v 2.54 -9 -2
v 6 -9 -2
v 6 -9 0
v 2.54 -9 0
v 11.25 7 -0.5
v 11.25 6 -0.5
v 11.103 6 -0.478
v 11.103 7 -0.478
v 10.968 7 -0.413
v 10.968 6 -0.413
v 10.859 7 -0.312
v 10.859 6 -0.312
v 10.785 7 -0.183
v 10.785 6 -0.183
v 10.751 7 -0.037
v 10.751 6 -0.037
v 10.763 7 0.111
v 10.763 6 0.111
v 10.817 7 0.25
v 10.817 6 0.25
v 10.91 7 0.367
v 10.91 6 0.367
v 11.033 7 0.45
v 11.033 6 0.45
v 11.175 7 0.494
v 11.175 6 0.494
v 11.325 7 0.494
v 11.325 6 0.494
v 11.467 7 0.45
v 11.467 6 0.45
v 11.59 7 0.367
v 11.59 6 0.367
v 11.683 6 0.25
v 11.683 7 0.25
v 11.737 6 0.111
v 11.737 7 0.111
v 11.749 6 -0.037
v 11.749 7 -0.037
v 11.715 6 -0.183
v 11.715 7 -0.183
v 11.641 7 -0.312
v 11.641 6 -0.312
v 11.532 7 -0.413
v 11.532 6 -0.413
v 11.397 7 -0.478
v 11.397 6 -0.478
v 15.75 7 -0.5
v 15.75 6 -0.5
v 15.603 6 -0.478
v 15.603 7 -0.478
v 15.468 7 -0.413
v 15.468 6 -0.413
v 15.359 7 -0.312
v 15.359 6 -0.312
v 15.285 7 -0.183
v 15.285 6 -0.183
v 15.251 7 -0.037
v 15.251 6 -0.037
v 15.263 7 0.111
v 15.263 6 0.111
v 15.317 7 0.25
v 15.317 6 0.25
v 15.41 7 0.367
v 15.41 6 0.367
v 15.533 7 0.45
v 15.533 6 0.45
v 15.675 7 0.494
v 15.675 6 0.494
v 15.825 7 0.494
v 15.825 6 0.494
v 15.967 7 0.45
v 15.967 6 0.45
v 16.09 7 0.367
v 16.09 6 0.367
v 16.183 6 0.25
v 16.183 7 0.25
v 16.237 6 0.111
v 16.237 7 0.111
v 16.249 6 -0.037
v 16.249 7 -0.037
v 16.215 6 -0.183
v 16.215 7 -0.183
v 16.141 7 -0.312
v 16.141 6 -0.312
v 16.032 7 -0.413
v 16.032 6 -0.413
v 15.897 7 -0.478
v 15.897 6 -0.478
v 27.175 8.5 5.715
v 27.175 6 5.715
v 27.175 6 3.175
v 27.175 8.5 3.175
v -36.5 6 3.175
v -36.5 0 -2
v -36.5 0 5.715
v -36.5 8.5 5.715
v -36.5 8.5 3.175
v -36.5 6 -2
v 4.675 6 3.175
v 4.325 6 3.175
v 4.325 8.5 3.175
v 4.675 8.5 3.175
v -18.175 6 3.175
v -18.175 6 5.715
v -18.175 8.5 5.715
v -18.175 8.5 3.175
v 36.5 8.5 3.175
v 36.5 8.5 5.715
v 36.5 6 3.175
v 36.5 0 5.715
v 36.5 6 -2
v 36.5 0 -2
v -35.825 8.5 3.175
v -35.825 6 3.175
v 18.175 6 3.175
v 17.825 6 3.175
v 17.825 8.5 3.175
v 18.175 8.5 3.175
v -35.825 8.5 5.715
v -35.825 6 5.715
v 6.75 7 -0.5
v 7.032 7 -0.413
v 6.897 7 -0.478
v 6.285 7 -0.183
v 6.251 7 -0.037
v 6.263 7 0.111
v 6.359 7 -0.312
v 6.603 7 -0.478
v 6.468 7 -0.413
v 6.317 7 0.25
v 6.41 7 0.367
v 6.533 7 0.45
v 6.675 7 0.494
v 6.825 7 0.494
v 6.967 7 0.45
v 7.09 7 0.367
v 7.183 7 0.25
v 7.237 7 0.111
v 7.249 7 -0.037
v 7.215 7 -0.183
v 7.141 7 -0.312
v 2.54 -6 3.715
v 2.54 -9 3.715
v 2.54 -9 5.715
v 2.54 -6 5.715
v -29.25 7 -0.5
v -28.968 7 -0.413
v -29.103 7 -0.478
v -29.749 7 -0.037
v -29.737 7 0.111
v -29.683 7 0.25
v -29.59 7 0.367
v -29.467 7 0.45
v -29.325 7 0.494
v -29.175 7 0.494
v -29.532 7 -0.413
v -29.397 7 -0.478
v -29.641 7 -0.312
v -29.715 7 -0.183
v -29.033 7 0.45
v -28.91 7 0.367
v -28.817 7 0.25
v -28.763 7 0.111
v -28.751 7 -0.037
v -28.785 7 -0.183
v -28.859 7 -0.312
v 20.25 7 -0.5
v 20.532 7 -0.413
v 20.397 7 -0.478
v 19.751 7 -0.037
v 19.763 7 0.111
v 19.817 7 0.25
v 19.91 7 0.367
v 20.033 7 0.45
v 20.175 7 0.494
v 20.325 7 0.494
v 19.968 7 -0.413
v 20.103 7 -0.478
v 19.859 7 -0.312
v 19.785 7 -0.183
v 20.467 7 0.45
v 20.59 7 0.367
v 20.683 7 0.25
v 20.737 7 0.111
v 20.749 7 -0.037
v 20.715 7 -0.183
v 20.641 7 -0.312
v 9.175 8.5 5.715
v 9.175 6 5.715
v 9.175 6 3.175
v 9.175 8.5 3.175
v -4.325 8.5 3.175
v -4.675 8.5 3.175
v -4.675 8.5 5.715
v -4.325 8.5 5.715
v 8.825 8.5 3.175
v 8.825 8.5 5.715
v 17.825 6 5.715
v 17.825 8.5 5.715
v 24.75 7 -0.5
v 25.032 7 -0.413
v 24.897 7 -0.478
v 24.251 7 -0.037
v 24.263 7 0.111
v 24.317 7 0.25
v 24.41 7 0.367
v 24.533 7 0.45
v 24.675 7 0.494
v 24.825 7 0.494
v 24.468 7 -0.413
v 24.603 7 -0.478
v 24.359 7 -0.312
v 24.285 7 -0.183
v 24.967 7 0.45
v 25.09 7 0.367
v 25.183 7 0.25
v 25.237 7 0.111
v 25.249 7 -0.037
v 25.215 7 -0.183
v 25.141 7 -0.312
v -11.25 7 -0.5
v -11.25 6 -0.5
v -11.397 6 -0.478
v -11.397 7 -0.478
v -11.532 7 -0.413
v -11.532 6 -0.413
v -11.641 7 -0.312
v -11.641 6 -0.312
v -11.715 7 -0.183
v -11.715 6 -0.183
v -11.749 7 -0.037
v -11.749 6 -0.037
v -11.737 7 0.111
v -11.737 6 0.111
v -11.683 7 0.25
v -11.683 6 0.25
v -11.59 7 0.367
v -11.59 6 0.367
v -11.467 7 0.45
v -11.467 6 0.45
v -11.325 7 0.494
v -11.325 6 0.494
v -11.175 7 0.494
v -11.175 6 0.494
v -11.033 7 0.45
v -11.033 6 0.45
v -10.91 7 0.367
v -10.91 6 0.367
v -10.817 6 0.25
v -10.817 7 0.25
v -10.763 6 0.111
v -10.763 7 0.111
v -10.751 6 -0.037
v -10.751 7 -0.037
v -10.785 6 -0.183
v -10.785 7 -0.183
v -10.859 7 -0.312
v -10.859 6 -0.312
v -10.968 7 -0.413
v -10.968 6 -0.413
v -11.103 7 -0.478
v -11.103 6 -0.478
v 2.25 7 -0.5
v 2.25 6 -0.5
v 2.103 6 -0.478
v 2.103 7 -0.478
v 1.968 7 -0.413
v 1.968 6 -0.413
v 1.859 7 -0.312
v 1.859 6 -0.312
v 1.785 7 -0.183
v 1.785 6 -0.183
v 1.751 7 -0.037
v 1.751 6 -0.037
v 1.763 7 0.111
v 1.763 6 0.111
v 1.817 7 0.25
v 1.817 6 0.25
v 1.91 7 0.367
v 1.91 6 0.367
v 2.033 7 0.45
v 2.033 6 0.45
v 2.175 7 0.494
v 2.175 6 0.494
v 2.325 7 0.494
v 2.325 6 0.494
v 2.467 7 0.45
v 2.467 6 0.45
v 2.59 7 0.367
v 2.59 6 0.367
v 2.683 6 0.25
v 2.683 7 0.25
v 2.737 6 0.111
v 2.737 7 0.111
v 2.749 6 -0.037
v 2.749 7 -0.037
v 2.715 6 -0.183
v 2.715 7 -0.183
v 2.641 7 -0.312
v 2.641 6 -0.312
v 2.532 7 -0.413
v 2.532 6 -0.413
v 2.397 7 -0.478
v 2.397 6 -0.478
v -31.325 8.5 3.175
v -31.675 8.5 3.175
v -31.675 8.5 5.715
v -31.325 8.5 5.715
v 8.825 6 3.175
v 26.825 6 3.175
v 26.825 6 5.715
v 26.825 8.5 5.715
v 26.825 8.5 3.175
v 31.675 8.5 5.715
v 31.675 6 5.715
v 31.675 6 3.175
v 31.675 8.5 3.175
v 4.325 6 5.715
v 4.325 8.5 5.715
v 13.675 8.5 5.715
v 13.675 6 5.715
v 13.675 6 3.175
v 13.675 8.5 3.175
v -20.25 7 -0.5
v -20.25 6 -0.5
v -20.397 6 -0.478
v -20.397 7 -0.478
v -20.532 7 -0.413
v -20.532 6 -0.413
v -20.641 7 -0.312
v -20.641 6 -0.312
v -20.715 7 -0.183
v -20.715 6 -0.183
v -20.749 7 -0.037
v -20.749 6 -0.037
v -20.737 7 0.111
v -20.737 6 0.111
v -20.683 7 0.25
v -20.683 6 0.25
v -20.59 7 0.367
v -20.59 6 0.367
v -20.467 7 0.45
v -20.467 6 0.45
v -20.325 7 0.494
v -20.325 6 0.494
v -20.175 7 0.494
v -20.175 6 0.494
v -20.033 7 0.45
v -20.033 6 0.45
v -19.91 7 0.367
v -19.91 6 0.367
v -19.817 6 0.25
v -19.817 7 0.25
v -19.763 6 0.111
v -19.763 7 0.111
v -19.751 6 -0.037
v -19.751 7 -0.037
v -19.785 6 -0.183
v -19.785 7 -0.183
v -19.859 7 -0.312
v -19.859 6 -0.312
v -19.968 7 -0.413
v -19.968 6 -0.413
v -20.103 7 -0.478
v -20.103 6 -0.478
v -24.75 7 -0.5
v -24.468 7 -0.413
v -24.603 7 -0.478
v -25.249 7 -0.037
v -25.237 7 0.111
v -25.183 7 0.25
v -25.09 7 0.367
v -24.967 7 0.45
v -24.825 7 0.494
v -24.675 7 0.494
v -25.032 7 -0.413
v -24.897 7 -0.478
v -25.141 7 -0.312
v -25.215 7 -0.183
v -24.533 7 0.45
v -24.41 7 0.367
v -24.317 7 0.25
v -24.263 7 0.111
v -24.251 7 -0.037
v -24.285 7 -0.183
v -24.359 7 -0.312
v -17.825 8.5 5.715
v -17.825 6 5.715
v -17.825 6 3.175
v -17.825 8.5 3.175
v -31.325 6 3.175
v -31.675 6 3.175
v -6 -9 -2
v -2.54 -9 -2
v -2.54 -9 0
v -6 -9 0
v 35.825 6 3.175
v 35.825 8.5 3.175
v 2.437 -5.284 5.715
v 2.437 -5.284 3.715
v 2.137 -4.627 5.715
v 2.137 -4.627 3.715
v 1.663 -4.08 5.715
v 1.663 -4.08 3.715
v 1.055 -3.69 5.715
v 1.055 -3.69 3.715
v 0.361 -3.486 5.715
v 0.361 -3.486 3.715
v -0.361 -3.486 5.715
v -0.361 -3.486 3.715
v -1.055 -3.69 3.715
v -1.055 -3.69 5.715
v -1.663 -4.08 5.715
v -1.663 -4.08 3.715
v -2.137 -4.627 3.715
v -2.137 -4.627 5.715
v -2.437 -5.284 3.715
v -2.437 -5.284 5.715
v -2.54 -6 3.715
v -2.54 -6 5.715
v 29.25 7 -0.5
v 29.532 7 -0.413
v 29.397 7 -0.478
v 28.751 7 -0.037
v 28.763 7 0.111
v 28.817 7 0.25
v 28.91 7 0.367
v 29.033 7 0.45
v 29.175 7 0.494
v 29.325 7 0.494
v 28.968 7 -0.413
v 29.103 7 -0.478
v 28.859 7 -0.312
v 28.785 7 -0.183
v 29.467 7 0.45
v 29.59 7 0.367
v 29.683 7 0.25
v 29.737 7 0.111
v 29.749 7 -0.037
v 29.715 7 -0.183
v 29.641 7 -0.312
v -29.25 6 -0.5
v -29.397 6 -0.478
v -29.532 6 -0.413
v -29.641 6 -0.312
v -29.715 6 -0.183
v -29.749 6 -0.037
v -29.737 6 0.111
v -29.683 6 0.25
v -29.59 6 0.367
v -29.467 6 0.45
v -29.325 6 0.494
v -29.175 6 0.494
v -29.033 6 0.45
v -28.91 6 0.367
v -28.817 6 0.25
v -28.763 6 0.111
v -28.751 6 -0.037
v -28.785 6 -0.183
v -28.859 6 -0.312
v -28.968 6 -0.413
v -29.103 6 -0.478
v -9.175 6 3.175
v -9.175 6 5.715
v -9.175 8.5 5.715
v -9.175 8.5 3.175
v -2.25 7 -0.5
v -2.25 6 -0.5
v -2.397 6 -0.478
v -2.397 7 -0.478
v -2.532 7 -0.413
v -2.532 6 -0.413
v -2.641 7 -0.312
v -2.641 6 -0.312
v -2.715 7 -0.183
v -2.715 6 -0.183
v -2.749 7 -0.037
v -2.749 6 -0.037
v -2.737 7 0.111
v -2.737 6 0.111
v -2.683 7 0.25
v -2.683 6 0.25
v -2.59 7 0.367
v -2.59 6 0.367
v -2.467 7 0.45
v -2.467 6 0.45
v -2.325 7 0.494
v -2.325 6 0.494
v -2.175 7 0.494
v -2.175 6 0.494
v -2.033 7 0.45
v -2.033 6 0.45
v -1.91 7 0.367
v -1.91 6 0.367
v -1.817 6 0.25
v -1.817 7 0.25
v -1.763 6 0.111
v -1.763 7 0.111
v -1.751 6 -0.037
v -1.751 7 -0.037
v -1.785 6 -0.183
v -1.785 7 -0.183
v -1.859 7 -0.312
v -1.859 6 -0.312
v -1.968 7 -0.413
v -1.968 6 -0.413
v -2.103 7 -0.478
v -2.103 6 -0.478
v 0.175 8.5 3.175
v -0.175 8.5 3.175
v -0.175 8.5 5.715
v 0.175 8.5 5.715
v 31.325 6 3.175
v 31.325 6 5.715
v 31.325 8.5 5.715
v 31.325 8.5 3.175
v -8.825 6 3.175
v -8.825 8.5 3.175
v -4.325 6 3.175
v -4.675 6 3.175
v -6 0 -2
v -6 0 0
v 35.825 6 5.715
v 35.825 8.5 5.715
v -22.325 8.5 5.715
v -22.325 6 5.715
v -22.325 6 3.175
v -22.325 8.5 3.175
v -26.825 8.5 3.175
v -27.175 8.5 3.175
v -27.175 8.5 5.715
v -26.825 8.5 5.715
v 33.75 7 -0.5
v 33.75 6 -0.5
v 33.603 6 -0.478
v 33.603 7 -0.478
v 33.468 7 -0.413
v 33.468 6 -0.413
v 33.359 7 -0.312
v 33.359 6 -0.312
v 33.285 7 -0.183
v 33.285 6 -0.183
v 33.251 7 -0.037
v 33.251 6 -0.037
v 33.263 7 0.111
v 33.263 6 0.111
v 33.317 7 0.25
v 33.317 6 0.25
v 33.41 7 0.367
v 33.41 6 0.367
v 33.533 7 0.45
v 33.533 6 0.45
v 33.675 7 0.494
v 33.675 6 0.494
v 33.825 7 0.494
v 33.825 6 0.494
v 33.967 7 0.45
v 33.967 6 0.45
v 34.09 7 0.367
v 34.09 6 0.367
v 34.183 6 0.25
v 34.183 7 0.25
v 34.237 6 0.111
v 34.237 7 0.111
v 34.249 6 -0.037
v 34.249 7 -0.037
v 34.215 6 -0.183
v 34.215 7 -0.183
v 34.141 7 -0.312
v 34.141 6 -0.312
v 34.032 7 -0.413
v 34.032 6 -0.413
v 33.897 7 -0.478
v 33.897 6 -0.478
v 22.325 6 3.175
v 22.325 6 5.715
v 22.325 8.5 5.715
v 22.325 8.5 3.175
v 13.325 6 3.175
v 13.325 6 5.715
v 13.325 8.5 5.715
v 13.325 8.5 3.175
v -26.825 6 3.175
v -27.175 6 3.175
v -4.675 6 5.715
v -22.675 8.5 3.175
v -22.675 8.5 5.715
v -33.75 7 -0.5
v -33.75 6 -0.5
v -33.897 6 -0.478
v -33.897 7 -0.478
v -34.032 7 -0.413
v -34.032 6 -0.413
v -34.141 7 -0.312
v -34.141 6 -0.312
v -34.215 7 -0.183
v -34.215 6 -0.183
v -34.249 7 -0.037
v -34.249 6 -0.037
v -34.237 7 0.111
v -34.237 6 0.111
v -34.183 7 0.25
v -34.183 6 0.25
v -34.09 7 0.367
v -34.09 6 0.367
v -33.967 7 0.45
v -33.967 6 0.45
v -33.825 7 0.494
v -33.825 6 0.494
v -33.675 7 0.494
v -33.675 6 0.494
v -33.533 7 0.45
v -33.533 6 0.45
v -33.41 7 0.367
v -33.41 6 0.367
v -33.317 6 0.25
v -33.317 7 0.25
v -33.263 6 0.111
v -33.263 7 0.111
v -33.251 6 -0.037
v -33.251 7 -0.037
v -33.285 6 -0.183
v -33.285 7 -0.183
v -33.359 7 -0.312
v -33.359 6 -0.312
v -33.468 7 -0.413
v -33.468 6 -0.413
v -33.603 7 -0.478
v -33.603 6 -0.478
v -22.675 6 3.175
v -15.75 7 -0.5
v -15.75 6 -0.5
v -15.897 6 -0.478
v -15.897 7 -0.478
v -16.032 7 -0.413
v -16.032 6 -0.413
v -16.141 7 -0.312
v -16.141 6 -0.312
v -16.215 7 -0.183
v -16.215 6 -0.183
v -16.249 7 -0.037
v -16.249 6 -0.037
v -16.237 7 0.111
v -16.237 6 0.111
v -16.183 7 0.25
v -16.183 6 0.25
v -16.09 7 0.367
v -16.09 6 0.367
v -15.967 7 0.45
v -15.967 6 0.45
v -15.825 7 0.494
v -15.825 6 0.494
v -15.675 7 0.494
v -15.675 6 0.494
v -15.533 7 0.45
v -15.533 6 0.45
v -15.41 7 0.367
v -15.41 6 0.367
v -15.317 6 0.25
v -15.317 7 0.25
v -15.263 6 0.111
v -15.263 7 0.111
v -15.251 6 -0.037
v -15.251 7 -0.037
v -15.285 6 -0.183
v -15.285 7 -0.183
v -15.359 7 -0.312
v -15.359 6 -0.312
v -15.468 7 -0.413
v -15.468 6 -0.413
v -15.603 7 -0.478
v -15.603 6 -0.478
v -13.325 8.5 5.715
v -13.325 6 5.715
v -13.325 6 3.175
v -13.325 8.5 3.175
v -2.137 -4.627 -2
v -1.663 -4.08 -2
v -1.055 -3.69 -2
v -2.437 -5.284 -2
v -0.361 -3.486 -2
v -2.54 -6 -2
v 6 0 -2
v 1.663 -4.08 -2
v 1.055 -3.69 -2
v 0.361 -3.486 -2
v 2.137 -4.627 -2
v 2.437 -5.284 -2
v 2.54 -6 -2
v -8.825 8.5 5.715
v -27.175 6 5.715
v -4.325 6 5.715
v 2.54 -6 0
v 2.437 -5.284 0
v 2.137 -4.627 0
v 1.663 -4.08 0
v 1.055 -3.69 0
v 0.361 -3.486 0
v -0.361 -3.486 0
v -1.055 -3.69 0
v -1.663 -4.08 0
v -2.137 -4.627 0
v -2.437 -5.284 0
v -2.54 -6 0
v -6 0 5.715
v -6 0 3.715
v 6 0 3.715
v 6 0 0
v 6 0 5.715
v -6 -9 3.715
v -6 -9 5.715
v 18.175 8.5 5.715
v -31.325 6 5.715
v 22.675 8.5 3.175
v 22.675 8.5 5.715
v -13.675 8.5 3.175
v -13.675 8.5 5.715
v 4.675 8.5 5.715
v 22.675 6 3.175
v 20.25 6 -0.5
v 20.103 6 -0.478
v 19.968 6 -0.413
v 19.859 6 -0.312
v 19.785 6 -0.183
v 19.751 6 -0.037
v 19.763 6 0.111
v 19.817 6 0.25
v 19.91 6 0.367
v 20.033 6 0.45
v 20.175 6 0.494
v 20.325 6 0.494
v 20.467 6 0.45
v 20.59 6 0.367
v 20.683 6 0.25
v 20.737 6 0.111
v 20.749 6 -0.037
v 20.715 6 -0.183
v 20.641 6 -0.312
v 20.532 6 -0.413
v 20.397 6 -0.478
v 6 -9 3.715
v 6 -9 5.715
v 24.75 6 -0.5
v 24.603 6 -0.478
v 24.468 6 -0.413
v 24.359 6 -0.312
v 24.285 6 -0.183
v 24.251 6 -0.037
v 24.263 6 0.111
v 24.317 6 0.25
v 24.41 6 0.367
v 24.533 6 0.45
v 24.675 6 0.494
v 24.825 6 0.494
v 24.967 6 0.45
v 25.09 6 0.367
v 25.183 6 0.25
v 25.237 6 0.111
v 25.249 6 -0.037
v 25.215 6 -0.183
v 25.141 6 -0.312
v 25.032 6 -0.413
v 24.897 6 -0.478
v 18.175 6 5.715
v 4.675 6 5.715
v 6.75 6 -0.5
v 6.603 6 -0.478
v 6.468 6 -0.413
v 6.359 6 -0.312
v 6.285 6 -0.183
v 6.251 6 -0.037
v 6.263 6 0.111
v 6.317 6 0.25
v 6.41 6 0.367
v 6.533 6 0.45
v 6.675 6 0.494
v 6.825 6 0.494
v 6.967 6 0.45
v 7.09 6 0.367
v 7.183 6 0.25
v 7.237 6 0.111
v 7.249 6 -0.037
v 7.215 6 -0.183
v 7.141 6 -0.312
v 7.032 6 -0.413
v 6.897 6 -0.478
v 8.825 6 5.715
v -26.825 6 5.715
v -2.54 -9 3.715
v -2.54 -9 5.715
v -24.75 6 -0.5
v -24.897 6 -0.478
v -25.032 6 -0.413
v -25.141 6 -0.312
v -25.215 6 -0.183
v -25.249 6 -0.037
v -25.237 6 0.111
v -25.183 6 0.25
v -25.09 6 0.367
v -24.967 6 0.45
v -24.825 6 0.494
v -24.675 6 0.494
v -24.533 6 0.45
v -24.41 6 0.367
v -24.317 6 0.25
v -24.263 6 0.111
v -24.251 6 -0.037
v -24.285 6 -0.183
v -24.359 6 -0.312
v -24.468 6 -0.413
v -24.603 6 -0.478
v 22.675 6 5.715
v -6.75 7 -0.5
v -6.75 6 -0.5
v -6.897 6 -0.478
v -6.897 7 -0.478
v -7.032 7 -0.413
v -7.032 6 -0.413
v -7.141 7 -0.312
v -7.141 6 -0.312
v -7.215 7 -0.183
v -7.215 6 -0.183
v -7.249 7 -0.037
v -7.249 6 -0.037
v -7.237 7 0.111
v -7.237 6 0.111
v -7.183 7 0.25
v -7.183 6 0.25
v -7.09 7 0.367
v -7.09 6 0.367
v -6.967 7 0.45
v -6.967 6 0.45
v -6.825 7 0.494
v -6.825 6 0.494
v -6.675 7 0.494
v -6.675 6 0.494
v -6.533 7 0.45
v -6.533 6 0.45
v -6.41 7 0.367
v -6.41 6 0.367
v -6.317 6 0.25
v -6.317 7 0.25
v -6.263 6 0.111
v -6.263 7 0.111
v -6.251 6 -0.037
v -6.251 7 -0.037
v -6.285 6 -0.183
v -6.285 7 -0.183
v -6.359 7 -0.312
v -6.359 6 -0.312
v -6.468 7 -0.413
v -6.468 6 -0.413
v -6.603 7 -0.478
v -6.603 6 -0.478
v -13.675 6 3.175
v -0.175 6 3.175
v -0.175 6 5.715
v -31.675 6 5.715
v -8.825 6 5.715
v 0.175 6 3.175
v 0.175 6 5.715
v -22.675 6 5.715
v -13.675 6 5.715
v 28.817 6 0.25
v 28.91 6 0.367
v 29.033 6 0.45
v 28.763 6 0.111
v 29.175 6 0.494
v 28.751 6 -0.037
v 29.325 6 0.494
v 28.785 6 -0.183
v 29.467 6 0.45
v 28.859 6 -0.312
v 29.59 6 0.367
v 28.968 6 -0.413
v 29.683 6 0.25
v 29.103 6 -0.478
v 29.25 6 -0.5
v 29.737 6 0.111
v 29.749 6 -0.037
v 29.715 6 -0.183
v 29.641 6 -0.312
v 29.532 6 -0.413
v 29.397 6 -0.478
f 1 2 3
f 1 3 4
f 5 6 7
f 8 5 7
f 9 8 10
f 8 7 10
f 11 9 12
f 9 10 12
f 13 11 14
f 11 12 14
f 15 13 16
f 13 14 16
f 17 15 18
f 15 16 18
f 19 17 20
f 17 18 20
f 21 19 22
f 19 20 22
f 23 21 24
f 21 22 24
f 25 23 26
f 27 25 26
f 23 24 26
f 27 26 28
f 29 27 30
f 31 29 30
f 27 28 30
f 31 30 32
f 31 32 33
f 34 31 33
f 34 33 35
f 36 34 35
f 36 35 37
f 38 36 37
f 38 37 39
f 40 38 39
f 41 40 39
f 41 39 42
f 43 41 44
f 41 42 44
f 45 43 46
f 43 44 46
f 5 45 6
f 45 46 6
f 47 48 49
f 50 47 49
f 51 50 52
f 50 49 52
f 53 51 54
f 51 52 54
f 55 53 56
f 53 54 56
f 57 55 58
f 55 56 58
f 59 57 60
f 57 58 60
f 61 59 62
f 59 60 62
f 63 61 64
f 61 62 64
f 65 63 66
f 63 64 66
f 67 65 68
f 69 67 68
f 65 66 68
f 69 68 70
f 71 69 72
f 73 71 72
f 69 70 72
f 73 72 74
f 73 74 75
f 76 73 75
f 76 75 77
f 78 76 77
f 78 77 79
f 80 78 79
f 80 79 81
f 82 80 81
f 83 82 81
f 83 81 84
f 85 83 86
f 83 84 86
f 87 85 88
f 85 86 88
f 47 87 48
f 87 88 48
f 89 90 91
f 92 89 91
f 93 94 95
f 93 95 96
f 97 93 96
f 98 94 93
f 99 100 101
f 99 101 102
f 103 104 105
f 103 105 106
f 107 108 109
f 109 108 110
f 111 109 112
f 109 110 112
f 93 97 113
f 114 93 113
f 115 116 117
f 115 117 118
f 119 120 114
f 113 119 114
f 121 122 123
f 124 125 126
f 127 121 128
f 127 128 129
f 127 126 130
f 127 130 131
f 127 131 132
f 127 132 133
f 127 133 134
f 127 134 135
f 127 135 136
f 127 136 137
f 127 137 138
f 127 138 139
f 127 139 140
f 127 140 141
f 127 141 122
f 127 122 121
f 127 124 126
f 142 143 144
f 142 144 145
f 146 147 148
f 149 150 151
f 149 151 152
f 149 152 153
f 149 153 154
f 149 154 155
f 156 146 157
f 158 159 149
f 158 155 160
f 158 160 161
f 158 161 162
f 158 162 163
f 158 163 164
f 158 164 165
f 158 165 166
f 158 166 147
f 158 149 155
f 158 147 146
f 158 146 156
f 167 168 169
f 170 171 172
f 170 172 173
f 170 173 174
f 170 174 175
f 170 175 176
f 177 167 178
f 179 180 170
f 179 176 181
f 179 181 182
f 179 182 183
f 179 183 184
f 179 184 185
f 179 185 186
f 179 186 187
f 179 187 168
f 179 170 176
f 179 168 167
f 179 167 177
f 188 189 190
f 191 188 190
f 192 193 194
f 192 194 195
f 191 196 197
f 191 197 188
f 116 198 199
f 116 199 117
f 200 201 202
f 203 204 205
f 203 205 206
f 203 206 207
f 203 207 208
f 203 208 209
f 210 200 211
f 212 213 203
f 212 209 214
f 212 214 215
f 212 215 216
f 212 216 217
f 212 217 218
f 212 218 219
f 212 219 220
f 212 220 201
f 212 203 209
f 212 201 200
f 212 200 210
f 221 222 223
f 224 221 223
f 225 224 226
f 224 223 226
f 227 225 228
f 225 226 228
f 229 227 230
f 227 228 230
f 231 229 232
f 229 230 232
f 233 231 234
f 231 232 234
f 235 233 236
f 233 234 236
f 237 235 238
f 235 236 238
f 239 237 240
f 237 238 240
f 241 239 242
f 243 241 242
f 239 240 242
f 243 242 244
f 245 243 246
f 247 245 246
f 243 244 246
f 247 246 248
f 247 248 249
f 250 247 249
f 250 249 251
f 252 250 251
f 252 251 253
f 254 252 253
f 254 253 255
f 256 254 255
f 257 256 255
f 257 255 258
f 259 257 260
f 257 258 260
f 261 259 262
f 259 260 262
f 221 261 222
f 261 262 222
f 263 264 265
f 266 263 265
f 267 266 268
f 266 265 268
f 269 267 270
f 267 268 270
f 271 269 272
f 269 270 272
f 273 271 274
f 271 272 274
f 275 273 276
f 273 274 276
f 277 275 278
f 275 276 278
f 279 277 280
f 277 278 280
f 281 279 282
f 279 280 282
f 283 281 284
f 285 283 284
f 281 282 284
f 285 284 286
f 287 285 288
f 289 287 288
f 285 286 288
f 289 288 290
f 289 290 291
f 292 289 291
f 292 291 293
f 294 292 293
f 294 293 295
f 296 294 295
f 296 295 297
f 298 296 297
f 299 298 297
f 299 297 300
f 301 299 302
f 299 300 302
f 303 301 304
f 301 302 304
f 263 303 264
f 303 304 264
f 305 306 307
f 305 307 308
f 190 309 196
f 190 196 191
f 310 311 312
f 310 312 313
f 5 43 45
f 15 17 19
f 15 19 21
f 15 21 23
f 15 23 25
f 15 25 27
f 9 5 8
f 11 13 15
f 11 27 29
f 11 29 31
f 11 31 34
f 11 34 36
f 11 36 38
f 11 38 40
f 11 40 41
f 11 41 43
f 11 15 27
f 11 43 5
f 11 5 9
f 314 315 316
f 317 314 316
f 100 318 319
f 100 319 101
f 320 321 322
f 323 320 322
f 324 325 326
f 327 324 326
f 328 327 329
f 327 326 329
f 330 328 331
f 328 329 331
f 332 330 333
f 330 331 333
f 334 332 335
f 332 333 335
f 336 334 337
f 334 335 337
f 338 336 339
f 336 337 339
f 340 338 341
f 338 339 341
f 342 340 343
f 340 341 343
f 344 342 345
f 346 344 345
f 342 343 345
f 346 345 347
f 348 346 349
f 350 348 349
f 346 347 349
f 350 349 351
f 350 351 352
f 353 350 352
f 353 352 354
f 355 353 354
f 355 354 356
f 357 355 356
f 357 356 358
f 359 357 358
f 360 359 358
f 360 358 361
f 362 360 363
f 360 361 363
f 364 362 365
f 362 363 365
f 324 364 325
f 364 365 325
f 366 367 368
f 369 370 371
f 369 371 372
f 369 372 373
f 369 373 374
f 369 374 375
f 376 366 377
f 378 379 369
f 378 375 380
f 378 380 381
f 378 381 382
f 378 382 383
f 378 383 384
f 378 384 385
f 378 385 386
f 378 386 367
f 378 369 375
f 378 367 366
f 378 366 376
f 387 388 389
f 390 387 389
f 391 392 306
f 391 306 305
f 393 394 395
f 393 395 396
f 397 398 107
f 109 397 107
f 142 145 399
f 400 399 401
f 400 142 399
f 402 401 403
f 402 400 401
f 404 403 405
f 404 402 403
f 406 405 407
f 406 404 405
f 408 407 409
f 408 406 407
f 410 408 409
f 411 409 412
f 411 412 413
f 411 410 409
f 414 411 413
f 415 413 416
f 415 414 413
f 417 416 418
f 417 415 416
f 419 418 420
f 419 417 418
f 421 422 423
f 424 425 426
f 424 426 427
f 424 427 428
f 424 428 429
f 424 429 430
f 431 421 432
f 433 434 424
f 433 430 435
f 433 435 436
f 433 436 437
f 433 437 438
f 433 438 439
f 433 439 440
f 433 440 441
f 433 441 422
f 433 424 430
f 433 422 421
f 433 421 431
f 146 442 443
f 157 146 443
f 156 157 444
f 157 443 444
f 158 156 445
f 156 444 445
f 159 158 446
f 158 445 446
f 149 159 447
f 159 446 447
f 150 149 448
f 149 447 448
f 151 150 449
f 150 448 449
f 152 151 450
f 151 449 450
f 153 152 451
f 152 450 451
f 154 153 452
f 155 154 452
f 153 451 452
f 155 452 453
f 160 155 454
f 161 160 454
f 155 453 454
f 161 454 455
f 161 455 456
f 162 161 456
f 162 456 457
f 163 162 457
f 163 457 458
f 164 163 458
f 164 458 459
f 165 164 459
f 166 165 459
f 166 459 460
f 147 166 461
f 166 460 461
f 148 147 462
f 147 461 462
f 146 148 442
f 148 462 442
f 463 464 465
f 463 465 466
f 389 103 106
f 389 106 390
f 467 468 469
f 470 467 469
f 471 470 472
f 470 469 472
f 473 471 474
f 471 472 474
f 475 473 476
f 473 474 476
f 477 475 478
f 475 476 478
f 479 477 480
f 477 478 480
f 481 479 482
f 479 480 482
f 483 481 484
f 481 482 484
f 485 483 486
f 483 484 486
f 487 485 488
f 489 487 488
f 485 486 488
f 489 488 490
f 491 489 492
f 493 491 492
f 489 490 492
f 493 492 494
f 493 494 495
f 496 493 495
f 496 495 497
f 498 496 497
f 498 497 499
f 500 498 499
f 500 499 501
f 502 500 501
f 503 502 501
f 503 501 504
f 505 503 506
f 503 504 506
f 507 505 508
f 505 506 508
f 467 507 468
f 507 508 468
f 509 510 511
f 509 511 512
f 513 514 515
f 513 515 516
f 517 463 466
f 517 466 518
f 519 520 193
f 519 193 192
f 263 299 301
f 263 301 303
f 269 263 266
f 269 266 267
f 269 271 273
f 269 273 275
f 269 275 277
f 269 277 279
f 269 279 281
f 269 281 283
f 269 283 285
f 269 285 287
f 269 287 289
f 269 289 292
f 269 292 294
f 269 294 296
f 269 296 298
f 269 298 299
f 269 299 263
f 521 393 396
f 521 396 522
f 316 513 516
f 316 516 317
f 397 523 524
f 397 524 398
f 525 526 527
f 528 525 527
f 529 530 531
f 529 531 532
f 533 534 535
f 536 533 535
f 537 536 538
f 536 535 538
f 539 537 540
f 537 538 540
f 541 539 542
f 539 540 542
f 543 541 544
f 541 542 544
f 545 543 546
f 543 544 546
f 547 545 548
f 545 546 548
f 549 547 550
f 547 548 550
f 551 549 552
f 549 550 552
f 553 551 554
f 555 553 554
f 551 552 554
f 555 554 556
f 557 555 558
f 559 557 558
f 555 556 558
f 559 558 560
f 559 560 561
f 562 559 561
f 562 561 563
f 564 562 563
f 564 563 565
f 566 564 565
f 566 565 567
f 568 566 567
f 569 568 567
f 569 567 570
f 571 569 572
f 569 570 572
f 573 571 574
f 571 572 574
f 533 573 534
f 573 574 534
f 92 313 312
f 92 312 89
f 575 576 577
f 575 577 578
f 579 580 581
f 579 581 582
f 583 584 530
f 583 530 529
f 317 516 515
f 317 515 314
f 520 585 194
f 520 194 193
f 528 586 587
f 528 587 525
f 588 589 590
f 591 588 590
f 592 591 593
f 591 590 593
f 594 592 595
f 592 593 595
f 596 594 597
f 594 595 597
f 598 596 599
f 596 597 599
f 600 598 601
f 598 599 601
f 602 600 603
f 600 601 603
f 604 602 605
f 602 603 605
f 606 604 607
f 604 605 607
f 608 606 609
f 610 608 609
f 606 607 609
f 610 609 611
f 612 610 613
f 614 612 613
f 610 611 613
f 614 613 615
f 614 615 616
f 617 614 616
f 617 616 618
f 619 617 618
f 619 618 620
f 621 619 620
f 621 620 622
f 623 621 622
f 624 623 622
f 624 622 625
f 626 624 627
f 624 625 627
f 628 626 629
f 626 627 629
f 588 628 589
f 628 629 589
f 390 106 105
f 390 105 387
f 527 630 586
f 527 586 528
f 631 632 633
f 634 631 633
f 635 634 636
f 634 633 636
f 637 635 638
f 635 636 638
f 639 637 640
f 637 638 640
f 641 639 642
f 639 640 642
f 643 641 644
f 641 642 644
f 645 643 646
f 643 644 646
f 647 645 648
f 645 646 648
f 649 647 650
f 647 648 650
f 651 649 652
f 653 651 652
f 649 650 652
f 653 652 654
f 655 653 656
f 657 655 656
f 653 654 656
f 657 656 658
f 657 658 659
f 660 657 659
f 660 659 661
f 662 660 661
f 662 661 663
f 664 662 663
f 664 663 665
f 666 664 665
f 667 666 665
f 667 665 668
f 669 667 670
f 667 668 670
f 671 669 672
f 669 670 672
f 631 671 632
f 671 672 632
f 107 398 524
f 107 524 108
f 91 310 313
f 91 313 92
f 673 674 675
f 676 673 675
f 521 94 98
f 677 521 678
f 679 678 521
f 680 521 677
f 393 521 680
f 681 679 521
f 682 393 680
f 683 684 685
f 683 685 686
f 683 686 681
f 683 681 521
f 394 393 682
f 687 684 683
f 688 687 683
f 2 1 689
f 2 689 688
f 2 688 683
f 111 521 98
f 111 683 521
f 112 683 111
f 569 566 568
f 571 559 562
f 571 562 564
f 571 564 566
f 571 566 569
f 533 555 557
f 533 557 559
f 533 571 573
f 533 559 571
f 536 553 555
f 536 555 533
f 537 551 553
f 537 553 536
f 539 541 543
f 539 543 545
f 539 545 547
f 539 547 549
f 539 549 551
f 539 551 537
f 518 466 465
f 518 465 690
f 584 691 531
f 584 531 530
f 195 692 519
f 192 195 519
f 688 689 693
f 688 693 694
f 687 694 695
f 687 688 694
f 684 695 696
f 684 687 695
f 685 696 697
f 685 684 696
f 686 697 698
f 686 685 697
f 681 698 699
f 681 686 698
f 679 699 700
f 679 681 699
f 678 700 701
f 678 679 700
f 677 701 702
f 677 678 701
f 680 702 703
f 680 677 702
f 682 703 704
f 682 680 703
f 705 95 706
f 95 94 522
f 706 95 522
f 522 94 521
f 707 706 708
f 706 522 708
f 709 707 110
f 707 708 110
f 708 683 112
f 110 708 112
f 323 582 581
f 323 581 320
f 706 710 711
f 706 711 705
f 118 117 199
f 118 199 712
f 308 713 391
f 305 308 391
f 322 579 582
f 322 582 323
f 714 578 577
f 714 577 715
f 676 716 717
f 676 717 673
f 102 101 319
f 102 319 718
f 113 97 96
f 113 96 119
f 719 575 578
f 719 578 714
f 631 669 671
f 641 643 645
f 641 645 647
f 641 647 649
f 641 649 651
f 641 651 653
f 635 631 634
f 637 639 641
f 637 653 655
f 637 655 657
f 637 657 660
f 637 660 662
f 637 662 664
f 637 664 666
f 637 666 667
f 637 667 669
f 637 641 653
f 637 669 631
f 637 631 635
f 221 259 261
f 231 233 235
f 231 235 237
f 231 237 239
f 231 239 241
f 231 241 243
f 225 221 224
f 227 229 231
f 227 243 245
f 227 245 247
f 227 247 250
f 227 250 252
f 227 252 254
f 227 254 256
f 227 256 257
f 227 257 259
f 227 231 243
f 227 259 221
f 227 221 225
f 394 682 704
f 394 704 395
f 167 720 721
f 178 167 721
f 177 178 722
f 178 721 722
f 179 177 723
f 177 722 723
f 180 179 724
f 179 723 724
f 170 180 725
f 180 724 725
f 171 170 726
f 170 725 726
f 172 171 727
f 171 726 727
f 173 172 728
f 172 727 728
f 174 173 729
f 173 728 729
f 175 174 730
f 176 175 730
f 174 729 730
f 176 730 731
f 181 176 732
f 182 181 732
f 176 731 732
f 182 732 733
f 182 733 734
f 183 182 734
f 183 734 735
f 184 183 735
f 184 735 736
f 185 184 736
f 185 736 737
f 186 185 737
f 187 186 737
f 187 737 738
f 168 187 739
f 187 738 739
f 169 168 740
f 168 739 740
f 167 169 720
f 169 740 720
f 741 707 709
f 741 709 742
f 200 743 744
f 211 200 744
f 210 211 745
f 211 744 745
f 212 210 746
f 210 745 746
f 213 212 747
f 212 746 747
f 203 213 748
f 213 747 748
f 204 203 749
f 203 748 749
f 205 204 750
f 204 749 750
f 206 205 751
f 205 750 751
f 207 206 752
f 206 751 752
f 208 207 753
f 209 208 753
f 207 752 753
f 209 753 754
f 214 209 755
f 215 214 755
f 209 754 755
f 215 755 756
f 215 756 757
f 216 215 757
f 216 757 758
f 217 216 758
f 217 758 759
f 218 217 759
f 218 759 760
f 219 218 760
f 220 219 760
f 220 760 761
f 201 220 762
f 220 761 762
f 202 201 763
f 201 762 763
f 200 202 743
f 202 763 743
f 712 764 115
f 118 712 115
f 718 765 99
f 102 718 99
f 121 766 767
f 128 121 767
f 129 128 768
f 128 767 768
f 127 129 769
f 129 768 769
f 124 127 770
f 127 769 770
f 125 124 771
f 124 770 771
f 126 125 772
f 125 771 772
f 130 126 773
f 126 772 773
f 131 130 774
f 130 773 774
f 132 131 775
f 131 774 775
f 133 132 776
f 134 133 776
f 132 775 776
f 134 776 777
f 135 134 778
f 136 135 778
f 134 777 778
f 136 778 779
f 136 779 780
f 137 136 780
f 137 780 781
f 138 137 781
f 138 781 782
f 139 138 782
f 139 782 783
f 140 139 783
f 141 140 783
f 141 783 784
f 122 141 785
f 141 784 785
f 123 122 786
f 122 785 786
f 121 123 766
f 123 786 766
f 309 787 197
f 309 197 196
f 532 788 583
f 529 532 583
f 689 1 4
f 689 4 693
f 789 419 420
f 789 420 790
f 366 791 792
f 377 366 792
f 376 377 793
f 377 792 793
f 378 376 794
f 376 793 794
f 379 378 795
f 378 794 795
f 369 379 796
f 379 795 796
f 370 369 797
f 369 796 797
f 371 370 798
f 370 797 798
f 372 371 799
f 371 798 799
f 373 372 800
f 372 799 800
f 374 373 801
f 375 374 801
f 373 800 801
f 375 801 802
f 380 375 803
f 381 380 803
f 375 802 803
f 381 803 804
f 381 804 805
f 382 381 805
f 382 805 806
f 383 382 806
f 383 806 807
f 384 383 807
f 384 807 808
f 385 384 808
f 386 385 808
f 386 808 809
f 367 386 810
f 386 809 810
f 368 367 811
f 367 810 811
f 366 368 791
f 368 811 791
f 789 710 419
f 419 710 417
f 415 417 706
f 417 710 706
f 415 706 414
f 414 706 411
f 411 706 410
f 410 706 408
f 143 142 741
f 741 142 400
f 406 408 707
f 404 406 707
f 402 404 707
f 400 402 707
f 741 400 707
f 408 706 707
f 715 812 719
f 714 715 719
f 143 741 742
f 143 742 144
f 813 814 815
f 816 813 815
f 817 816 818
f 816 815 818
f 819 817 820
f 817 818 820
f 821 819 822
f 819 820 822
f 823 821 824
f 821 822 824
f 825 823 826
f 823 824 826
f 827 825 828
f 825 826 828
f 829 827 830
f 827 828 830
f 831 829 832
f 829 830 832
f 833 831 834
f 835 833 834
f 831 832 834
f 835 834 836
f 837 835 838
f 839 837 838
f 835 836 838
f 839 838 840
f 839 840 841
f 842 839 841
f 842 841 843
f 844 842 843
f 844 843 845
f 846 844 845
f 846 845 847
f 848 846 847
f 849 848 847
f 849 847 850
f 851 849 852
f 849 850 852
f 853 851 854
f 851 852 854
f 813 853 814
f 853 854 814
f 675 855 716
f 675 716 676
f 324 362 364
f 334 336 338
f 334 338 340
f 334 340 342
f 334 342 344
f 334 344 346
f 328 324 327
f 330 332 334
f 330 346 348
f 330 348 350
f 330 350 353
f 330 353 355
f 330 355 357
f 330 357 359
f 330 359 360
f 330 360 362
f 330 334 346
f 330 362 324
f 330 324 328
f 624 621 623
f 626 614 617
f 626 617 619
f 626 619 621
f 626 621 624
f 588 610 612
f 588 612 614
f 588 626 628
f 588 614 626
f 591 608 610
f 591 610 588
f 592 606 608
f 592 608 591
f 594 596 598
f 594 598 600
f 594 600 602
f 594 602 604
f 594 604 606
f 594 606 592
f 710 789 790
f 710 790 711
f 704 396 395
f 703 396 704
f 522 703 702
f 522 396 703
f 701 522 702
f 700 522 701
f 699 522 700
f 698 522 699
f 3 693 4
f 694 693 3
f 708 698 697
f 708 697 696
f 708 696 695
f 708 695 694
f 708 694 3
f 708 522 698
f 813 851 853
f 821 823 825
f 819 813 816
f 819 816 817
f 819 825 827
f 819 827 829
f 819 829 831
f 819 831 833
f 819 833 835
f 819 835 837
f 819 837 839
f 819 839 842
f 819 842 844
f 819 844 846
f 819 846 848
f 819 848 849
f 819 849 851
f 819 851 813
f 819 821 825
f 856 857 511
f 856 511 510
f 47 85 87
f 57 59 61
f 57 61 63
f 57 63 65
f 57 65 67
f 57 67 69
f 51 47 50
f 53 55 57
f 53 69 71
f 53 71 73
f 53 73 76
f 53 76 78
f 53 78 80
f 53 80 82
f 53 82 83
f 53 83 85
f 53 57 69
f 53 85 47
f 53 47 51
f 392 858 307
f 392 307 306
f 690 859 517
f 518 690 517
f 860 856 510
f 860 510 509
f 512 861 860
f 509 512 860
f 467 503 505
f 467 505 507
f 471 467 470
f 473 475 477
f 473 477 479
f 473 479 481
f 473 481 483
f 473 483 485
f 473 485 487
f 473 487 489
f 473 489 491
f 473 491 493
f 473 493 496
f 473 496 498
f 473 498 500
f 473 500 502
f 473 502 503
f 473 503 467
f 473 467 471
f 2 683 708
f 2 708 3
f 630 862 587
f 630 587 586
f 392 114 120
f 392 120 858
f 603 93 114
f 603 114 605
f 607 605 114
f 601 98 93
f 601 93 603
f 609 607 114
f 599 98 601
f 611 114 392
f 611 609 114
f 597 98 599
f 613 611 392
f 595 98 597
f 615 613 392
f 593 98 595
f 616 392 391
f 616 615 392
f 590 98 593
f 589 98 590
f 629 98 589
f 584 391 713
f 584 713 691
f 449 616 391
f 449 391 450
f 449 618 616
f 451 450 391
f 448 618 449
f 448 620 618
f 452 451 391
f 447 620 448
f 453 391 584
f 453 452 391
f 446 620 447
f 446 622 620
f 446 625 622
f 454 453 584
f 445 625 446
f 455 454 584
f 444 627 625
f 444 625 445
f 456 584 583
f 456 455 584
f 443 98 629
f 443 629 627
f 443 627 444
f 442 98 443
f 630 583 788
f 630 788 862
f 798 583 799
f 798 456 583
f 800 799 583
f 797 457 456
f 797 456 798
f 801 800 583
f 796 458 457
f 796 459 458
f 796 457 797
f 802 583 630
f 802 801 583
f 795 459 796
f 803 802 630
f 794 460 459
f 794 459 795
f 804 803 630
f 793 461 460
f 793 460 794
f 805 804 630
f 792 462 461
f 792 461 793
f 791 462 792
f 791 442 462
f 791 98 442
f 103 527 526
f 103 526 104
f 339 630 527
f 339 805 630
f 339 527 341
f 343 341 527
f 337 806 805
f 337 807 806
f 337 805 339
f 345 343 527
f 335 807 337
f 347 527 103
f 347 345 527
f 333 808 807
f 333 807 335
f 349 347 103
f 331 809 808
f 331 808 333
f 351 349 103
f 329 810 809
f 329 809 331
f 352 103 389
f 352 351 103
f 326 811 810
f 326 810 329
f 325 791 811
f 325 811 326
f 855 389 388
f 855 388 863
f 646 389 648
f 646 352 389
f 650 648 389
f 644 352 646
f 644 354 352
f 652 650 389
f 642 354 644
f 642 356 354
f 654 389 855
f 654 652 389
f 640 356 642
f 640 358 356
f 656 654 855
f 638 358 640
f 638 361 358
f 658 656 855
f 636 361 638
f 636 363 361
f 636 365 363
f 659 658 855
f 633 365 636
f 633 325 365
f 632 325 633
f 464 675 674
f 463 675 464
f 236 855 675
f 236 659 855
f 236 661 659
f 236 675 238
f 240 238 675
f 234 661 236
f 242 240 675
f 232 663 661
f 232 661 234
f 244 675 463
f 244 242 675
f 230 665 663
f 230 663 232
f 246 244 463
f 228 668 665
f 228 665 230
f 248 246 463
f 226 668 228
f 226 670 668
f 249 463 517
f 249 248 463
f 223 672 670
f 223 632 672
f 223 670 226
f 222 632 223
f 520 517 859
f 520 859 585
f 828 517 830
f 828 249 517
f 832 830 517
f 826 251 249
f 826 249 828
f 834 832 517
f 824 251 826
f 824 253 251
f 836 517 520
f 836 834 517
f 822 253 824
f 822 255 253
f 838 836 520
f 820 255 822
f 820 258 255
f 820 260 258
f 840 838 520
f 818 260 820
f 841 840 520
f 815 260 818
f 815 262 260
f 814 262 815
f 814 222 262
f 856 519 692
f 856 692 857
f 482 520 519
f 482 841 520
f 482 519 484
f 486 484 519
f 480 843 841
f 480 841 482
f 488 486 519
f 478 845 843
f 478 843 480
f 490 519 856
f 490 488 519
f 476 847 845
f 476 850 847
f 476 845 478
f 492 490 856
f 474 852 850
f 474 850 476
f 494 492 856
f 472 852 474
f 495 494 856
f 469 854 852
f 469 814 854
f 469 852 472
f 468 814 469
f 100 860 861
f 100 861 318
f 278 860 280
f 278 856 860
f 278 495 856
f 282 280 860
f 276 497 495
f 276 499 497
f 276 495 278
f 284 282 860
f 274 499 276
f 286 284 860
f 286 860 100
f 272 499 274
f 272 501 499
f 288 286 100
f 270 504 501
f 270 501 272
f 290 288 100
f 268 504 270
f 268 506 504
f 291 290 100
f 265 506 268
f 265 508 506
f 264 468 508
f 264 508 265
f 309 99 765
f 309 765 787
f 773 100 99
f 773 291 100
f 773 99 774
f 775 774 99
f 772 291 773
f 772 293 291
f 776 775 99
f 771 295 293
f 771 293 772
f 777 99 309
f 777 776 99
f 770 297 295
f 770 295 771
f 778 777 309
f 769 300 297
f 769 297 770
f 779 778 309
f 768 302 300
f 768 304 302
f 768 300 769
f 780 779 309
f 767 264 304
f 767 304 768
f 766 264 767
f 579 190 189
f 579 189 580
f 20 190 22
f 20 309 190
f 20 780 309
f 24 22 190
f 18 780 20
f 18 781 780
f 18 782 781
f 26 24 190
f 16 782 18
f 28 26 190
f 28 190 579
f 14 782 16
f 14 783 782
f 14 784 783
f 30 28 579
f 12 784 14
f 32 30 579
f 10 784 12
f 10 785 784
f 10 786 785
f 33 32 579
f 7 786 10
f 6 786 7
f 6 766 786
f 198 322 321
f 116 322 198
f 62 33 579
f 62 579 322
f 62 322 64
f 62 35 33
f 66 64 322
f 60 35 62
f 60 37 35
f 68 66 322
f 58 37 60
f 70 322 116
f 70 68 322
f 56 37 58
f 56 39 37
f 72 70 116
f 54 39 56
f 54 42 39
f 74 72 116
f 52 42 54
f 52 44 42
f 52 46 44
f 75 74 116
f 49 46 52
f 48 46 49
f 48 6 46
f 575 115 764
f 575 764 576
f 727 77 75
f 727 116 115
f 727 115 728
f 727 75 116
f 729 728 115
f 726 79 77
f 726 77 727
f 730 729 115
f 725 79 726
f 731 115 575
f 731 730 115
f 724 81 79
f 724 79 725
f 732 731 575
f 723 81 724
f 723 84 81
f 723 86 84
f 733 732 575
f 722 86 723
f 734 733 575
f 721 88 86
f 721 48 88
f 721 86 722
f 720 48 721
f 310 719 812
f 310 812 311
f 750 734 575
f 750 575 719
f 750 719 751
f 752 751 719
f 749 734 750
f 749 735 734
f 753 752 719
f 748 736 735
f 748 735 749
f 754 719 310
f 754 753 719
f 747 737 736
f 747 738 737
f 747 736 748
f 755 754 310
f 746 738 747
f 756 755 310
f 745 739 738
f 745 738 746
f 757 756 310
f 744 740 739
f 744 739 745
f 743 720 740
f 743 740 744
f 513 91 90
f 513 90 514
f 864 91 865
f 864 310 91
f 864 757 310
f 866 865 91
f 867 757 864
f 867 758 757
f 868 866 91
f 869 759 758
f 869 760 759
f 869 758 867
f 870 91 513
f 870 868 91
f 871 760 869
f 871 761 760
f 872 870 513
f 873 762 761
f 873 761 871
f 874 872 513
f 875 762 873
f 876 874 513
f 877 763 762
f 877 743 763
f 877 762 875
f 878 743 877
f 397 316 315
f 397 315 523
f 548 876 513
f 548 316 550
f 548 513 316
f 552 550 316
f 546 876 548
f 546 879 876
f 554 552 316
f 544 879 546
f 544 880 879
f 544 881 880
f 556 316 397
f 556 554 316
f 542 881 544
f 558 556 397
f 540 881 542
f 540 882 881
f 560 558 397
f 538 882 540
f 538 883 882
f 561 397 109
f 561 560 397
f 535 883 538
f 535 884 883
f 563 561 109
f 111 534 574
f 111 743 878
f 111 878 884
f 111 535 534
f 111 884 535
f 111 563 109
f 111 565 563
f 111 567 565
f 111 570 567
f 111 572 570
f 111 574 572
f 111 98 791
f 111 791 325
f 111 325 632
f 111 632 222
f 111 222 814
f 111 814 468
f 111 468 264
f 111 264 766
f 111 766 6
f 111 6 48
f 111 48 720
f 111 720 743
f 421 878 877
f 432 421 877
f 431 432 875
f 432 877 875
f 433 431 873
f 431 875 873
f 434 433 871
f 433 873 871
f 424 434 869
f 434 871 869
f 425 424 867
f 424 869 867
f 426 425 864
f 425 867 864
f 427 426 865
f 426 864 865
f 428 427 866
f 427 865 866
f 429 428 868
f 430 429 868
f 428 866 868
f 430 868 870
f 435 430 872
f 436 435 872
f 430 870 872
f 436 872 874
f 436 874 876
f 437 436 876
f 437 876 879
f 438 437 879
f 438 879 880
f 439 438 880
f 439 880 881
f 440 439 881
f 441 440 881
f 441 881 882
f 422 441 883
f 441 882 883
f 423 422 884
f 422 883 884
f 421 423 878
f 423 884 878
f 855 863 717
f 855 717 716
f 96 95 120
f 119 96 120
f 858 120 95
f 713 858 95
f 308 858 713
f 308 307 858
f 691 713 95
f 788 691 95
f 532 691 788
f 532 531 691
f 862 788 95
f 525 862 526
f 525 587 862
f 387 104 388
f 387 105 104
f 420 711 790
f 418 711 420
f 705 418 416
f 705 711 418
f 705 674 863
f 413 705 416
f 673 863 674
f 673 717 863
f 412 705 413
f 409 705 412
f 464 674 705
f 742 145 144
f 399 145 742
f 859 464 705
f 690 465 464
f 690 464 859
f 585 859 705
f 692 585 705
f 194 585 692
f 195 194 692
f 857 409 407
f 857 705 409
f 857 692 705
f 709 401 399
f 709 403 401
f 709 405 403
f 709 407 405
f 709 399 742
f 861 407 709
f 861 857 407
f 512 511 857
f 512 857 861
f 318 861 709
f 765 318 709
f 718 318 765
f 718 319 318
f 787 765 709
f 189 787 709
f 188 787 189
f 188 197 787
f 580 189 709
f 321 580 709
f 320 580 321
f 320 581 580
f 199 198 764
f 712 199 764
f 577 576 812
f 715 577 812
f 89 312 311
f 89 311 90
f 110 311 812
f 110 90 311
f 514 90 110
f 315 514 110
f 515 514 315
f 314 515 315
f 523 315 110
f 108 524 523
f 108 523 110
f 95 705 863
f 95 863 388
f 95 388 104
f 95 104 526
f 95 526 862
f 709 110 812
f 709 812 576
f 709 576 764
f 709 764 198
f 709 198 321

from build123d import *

# Parameters (mm, degrees)
SKETCH1_W                 = 73
SKETCH1_H                 = 7.715
BOSS_EXTRUDE1_DEPTH       = 6
SKETCH2_R                 = 0.5
BOSS_EXTRUDE2_DEPTH       = 1
SKETCH3_W                 = 0.35
SKETCH3_H                 = 2.54
BOSS_EXTRUDE3_DEPTH       = 2.5
SKETCH4_W                 = 0.325
SKETCH4_H                 = 2.5
BOSS_EXTRUDE4_DEPTH       = 2.54
BOSS_EXTRUDE12_DEPTH      = 5.715
BOSS_EXTRUDE12_DEPTH_BACK = 2
SKETCH13_W                = 12
SKETCH13_H                = 3.715
CUT_EXTRUDE1_DEPTH        = 39.025139382


with BuildPart() as part:
    # Sketch1 → Boss-Extrude1 (new body)
    with BuildSketch(Plane(origin=(0, 0, 0), x_dir=(1, 0, 0), z_dir=(0, 1, 0))):
        with Locations((0, -1.8575)):
            Rectangle(SKETCH1_W, SKETCH1_H)
    extrude(amount=BOSS_EXTRUDE1_DEPTH)

    # Sketch2 → Boss-Extrude2 (add)
    with BuildSketch(Plane(origin=(0, 6, 0), x_dir=(1, 0, 0), z_dir=(0, 1, 0))):
        with Locations(Location((2.25, 0, 0), (0, 0, 90))):
            Circle(SKETCH2_R)
        with Locations(Location((6.75, 0, 0), (0, 0, 90))):
            Circle(SKETCH2_R)
        with Locations(Location((11.25, 0, 0), (0, 0, 90))):
            Circle(SKETCH2_R)
        with Locations(Location((15.75, 0, 0), (0, 0, 90))):
            Circle(SKETCH2_R)
        with Locations(Location((20.25, 0, 0), (0, 0, 90))):
            Circle(SKETCH2_R)
        with Locations(Location((24.75, 0, 0), (0, 0, 90))):
            Circle(SKETCH2_R)
        with Locations(Location((29.25, 0, 0), (0, 0, 90))):
            Circle(SKETCH2_R)
        with Locations(Location((33.75, 0, 0), (0, 0, 90))):
            Circle(SKETCH2_R)
        with Locations(Location((-33.75, 0, 0), (0, 0, 90))):
            Circle(SKETCH2_R)
        with Locations(Location((-29.25, 0, 0), (0, 0, 90))):
            Circle(SKETCH2_R)
        with Locations(Location((-24.75, 0, 0), (0, 0, 90))):
            Circle(SKETCH2_R)
        with Locations(Location((-20.25, 0, 0), (0, 0, 90))):
            Circle(SKETCH2_R)
        with Locations(Location((-15.75, 0, 0), (0, 0, 90))):
            Circle(SKETCH2_R)
        with Locations(Location((-11.25, 0, 0), (0, 0, 90))):
            Circle(SKETCH2_R)
        with Locations(Location((-6.75, 0, 0), (0, 0, 90))):
            Circle(SKETCH2_R)
        with Locations(Location((-2.25, 0, 0), (0, 0, 90))):
            Circle(SKETCH2_R)
    extrude(amount=BOSS_EXTRUDE2_DEPTH)

    # Sketch3 → Boss-Extrude3 (add)
    with BuildSketch(Plane(origin=(0, 6, 0), x_dir=(1, 0, 0), z_dir=(0, 1, 0))):
        with Locations((4.5, -4.445)):
            Rectangle(SKETCH3_W, SKETCH3_H)
        with Locations((0, -4.445)):
            Rectangle(SKETCH3_W, SKETCH3_H)
        with Locations((9, -4.445)):
            Rectangle(SKETCH3_W, SKETCH3_H)
        with Locations((13.5, -4.445)):
            Rectangle(SKETCH3_W, SKETCH3_H)
        with Locations((18, -4.445)):
            Rectangle(SKETCH3_W, SKETCH3_H)
        with Locations((22.5, -4.445)):
            Rectangle(SKETCH3_W, SKETCH3_H)
        with Locations((27, -4.445)):
            Rectangle(SKETCH3_W, SKETCH3_H)
        with Locations((31.5, -4.445)):
            Rectangle(SKETCH3_W, SKETCH3_H)
        with Locations((36, -4.445)):
            Rectangle(SKETCH3_W, SKETCH3_H)
        with Locations((-4.5, -4.445)):
            Rectangle(SKETCH3_W, SKETCH3_H)
        with Locations((-9, -4.445)):
            Rectangle(SKETCH3_W, SKETCH3_H)
        with Locations((-13.5, -4.445)):
            Rectangle(SKETCH3_W, SKETCH3_H)
        with Locations((-18, -4.445)):
            Rectangle(SKETCH3_W, SKETCH3_H)
        with Locations((-22.5, -4.445)):
            Rectangle(SKETCH3_W, SKETCH3_H)
        with Locations((-27, -4.445)):
            Rectangle(SKETCH3_W, SKETCH3_H)
        with Locations((-31.5, -4.445)):
            Rectangle(SKETCH3_W, SKETCH3_H)
        with Locations((-36, -4.445)):
            Rectangle(SKETCH3_W, SKETCH3_H)
    extrude(amount=BOSS_EXTRUDE3_DEPTH)

    # Sketch4 → Boss-Extrude4 (add)
    with BuildSketch(Plane.XY.offset(3.175)):
        with Locations((-36.3375, 7.25)):
            Rectangle(SKETCH4_W, SKETCH4_H)
        with Locations((36.3375, 7.25)):
            Rectangle(SKETCH4_W, SKETCH4_H)
    extrude(amount=BOSS_EXTRUDE4_DEPTH)

    # Sketch12 → Boss-Extrude12 (add, two sides: drawn at the far end of the back side and taken through both)
    with BuildSketch(Plane.XY.offset(-BOSS_EXTRUDE12_DEPTH_BACK)):
        with BuildLine():
            Line((-2.54, -6), (-2.54, -9))
            Line((-2.54, -9), (-6, -9))
            Line((-6, -9), (-6, 0))
            Line((-6, 0), (6, 0))
            Line((6, 0), (6, -9))
            Line((6, -9), (2.54, -9))
            Line((2.54, -9), (2.54, -6))
            ThreePointArc((2.54, -6), (0, -3.46), (-2.54, -6))
        make_face()
    extrude(amount=BOSS_EXTRUDE12_DEPTH + BOSS_EXTRUDE12_DEPTH_BACK)

    # Sketch13 → Cut-Extrude1 (cut, through all)
    with BuildSketch(Plane.XZ):
        with Locations((0, 1.8575)):
            Rectangle(SKETCH13_W, SKETCH13_H)
    extrude(amount=CUT_EXTRUDE1_DEPTH, mode=Mode.SUBTRACT)


solid = part.part
